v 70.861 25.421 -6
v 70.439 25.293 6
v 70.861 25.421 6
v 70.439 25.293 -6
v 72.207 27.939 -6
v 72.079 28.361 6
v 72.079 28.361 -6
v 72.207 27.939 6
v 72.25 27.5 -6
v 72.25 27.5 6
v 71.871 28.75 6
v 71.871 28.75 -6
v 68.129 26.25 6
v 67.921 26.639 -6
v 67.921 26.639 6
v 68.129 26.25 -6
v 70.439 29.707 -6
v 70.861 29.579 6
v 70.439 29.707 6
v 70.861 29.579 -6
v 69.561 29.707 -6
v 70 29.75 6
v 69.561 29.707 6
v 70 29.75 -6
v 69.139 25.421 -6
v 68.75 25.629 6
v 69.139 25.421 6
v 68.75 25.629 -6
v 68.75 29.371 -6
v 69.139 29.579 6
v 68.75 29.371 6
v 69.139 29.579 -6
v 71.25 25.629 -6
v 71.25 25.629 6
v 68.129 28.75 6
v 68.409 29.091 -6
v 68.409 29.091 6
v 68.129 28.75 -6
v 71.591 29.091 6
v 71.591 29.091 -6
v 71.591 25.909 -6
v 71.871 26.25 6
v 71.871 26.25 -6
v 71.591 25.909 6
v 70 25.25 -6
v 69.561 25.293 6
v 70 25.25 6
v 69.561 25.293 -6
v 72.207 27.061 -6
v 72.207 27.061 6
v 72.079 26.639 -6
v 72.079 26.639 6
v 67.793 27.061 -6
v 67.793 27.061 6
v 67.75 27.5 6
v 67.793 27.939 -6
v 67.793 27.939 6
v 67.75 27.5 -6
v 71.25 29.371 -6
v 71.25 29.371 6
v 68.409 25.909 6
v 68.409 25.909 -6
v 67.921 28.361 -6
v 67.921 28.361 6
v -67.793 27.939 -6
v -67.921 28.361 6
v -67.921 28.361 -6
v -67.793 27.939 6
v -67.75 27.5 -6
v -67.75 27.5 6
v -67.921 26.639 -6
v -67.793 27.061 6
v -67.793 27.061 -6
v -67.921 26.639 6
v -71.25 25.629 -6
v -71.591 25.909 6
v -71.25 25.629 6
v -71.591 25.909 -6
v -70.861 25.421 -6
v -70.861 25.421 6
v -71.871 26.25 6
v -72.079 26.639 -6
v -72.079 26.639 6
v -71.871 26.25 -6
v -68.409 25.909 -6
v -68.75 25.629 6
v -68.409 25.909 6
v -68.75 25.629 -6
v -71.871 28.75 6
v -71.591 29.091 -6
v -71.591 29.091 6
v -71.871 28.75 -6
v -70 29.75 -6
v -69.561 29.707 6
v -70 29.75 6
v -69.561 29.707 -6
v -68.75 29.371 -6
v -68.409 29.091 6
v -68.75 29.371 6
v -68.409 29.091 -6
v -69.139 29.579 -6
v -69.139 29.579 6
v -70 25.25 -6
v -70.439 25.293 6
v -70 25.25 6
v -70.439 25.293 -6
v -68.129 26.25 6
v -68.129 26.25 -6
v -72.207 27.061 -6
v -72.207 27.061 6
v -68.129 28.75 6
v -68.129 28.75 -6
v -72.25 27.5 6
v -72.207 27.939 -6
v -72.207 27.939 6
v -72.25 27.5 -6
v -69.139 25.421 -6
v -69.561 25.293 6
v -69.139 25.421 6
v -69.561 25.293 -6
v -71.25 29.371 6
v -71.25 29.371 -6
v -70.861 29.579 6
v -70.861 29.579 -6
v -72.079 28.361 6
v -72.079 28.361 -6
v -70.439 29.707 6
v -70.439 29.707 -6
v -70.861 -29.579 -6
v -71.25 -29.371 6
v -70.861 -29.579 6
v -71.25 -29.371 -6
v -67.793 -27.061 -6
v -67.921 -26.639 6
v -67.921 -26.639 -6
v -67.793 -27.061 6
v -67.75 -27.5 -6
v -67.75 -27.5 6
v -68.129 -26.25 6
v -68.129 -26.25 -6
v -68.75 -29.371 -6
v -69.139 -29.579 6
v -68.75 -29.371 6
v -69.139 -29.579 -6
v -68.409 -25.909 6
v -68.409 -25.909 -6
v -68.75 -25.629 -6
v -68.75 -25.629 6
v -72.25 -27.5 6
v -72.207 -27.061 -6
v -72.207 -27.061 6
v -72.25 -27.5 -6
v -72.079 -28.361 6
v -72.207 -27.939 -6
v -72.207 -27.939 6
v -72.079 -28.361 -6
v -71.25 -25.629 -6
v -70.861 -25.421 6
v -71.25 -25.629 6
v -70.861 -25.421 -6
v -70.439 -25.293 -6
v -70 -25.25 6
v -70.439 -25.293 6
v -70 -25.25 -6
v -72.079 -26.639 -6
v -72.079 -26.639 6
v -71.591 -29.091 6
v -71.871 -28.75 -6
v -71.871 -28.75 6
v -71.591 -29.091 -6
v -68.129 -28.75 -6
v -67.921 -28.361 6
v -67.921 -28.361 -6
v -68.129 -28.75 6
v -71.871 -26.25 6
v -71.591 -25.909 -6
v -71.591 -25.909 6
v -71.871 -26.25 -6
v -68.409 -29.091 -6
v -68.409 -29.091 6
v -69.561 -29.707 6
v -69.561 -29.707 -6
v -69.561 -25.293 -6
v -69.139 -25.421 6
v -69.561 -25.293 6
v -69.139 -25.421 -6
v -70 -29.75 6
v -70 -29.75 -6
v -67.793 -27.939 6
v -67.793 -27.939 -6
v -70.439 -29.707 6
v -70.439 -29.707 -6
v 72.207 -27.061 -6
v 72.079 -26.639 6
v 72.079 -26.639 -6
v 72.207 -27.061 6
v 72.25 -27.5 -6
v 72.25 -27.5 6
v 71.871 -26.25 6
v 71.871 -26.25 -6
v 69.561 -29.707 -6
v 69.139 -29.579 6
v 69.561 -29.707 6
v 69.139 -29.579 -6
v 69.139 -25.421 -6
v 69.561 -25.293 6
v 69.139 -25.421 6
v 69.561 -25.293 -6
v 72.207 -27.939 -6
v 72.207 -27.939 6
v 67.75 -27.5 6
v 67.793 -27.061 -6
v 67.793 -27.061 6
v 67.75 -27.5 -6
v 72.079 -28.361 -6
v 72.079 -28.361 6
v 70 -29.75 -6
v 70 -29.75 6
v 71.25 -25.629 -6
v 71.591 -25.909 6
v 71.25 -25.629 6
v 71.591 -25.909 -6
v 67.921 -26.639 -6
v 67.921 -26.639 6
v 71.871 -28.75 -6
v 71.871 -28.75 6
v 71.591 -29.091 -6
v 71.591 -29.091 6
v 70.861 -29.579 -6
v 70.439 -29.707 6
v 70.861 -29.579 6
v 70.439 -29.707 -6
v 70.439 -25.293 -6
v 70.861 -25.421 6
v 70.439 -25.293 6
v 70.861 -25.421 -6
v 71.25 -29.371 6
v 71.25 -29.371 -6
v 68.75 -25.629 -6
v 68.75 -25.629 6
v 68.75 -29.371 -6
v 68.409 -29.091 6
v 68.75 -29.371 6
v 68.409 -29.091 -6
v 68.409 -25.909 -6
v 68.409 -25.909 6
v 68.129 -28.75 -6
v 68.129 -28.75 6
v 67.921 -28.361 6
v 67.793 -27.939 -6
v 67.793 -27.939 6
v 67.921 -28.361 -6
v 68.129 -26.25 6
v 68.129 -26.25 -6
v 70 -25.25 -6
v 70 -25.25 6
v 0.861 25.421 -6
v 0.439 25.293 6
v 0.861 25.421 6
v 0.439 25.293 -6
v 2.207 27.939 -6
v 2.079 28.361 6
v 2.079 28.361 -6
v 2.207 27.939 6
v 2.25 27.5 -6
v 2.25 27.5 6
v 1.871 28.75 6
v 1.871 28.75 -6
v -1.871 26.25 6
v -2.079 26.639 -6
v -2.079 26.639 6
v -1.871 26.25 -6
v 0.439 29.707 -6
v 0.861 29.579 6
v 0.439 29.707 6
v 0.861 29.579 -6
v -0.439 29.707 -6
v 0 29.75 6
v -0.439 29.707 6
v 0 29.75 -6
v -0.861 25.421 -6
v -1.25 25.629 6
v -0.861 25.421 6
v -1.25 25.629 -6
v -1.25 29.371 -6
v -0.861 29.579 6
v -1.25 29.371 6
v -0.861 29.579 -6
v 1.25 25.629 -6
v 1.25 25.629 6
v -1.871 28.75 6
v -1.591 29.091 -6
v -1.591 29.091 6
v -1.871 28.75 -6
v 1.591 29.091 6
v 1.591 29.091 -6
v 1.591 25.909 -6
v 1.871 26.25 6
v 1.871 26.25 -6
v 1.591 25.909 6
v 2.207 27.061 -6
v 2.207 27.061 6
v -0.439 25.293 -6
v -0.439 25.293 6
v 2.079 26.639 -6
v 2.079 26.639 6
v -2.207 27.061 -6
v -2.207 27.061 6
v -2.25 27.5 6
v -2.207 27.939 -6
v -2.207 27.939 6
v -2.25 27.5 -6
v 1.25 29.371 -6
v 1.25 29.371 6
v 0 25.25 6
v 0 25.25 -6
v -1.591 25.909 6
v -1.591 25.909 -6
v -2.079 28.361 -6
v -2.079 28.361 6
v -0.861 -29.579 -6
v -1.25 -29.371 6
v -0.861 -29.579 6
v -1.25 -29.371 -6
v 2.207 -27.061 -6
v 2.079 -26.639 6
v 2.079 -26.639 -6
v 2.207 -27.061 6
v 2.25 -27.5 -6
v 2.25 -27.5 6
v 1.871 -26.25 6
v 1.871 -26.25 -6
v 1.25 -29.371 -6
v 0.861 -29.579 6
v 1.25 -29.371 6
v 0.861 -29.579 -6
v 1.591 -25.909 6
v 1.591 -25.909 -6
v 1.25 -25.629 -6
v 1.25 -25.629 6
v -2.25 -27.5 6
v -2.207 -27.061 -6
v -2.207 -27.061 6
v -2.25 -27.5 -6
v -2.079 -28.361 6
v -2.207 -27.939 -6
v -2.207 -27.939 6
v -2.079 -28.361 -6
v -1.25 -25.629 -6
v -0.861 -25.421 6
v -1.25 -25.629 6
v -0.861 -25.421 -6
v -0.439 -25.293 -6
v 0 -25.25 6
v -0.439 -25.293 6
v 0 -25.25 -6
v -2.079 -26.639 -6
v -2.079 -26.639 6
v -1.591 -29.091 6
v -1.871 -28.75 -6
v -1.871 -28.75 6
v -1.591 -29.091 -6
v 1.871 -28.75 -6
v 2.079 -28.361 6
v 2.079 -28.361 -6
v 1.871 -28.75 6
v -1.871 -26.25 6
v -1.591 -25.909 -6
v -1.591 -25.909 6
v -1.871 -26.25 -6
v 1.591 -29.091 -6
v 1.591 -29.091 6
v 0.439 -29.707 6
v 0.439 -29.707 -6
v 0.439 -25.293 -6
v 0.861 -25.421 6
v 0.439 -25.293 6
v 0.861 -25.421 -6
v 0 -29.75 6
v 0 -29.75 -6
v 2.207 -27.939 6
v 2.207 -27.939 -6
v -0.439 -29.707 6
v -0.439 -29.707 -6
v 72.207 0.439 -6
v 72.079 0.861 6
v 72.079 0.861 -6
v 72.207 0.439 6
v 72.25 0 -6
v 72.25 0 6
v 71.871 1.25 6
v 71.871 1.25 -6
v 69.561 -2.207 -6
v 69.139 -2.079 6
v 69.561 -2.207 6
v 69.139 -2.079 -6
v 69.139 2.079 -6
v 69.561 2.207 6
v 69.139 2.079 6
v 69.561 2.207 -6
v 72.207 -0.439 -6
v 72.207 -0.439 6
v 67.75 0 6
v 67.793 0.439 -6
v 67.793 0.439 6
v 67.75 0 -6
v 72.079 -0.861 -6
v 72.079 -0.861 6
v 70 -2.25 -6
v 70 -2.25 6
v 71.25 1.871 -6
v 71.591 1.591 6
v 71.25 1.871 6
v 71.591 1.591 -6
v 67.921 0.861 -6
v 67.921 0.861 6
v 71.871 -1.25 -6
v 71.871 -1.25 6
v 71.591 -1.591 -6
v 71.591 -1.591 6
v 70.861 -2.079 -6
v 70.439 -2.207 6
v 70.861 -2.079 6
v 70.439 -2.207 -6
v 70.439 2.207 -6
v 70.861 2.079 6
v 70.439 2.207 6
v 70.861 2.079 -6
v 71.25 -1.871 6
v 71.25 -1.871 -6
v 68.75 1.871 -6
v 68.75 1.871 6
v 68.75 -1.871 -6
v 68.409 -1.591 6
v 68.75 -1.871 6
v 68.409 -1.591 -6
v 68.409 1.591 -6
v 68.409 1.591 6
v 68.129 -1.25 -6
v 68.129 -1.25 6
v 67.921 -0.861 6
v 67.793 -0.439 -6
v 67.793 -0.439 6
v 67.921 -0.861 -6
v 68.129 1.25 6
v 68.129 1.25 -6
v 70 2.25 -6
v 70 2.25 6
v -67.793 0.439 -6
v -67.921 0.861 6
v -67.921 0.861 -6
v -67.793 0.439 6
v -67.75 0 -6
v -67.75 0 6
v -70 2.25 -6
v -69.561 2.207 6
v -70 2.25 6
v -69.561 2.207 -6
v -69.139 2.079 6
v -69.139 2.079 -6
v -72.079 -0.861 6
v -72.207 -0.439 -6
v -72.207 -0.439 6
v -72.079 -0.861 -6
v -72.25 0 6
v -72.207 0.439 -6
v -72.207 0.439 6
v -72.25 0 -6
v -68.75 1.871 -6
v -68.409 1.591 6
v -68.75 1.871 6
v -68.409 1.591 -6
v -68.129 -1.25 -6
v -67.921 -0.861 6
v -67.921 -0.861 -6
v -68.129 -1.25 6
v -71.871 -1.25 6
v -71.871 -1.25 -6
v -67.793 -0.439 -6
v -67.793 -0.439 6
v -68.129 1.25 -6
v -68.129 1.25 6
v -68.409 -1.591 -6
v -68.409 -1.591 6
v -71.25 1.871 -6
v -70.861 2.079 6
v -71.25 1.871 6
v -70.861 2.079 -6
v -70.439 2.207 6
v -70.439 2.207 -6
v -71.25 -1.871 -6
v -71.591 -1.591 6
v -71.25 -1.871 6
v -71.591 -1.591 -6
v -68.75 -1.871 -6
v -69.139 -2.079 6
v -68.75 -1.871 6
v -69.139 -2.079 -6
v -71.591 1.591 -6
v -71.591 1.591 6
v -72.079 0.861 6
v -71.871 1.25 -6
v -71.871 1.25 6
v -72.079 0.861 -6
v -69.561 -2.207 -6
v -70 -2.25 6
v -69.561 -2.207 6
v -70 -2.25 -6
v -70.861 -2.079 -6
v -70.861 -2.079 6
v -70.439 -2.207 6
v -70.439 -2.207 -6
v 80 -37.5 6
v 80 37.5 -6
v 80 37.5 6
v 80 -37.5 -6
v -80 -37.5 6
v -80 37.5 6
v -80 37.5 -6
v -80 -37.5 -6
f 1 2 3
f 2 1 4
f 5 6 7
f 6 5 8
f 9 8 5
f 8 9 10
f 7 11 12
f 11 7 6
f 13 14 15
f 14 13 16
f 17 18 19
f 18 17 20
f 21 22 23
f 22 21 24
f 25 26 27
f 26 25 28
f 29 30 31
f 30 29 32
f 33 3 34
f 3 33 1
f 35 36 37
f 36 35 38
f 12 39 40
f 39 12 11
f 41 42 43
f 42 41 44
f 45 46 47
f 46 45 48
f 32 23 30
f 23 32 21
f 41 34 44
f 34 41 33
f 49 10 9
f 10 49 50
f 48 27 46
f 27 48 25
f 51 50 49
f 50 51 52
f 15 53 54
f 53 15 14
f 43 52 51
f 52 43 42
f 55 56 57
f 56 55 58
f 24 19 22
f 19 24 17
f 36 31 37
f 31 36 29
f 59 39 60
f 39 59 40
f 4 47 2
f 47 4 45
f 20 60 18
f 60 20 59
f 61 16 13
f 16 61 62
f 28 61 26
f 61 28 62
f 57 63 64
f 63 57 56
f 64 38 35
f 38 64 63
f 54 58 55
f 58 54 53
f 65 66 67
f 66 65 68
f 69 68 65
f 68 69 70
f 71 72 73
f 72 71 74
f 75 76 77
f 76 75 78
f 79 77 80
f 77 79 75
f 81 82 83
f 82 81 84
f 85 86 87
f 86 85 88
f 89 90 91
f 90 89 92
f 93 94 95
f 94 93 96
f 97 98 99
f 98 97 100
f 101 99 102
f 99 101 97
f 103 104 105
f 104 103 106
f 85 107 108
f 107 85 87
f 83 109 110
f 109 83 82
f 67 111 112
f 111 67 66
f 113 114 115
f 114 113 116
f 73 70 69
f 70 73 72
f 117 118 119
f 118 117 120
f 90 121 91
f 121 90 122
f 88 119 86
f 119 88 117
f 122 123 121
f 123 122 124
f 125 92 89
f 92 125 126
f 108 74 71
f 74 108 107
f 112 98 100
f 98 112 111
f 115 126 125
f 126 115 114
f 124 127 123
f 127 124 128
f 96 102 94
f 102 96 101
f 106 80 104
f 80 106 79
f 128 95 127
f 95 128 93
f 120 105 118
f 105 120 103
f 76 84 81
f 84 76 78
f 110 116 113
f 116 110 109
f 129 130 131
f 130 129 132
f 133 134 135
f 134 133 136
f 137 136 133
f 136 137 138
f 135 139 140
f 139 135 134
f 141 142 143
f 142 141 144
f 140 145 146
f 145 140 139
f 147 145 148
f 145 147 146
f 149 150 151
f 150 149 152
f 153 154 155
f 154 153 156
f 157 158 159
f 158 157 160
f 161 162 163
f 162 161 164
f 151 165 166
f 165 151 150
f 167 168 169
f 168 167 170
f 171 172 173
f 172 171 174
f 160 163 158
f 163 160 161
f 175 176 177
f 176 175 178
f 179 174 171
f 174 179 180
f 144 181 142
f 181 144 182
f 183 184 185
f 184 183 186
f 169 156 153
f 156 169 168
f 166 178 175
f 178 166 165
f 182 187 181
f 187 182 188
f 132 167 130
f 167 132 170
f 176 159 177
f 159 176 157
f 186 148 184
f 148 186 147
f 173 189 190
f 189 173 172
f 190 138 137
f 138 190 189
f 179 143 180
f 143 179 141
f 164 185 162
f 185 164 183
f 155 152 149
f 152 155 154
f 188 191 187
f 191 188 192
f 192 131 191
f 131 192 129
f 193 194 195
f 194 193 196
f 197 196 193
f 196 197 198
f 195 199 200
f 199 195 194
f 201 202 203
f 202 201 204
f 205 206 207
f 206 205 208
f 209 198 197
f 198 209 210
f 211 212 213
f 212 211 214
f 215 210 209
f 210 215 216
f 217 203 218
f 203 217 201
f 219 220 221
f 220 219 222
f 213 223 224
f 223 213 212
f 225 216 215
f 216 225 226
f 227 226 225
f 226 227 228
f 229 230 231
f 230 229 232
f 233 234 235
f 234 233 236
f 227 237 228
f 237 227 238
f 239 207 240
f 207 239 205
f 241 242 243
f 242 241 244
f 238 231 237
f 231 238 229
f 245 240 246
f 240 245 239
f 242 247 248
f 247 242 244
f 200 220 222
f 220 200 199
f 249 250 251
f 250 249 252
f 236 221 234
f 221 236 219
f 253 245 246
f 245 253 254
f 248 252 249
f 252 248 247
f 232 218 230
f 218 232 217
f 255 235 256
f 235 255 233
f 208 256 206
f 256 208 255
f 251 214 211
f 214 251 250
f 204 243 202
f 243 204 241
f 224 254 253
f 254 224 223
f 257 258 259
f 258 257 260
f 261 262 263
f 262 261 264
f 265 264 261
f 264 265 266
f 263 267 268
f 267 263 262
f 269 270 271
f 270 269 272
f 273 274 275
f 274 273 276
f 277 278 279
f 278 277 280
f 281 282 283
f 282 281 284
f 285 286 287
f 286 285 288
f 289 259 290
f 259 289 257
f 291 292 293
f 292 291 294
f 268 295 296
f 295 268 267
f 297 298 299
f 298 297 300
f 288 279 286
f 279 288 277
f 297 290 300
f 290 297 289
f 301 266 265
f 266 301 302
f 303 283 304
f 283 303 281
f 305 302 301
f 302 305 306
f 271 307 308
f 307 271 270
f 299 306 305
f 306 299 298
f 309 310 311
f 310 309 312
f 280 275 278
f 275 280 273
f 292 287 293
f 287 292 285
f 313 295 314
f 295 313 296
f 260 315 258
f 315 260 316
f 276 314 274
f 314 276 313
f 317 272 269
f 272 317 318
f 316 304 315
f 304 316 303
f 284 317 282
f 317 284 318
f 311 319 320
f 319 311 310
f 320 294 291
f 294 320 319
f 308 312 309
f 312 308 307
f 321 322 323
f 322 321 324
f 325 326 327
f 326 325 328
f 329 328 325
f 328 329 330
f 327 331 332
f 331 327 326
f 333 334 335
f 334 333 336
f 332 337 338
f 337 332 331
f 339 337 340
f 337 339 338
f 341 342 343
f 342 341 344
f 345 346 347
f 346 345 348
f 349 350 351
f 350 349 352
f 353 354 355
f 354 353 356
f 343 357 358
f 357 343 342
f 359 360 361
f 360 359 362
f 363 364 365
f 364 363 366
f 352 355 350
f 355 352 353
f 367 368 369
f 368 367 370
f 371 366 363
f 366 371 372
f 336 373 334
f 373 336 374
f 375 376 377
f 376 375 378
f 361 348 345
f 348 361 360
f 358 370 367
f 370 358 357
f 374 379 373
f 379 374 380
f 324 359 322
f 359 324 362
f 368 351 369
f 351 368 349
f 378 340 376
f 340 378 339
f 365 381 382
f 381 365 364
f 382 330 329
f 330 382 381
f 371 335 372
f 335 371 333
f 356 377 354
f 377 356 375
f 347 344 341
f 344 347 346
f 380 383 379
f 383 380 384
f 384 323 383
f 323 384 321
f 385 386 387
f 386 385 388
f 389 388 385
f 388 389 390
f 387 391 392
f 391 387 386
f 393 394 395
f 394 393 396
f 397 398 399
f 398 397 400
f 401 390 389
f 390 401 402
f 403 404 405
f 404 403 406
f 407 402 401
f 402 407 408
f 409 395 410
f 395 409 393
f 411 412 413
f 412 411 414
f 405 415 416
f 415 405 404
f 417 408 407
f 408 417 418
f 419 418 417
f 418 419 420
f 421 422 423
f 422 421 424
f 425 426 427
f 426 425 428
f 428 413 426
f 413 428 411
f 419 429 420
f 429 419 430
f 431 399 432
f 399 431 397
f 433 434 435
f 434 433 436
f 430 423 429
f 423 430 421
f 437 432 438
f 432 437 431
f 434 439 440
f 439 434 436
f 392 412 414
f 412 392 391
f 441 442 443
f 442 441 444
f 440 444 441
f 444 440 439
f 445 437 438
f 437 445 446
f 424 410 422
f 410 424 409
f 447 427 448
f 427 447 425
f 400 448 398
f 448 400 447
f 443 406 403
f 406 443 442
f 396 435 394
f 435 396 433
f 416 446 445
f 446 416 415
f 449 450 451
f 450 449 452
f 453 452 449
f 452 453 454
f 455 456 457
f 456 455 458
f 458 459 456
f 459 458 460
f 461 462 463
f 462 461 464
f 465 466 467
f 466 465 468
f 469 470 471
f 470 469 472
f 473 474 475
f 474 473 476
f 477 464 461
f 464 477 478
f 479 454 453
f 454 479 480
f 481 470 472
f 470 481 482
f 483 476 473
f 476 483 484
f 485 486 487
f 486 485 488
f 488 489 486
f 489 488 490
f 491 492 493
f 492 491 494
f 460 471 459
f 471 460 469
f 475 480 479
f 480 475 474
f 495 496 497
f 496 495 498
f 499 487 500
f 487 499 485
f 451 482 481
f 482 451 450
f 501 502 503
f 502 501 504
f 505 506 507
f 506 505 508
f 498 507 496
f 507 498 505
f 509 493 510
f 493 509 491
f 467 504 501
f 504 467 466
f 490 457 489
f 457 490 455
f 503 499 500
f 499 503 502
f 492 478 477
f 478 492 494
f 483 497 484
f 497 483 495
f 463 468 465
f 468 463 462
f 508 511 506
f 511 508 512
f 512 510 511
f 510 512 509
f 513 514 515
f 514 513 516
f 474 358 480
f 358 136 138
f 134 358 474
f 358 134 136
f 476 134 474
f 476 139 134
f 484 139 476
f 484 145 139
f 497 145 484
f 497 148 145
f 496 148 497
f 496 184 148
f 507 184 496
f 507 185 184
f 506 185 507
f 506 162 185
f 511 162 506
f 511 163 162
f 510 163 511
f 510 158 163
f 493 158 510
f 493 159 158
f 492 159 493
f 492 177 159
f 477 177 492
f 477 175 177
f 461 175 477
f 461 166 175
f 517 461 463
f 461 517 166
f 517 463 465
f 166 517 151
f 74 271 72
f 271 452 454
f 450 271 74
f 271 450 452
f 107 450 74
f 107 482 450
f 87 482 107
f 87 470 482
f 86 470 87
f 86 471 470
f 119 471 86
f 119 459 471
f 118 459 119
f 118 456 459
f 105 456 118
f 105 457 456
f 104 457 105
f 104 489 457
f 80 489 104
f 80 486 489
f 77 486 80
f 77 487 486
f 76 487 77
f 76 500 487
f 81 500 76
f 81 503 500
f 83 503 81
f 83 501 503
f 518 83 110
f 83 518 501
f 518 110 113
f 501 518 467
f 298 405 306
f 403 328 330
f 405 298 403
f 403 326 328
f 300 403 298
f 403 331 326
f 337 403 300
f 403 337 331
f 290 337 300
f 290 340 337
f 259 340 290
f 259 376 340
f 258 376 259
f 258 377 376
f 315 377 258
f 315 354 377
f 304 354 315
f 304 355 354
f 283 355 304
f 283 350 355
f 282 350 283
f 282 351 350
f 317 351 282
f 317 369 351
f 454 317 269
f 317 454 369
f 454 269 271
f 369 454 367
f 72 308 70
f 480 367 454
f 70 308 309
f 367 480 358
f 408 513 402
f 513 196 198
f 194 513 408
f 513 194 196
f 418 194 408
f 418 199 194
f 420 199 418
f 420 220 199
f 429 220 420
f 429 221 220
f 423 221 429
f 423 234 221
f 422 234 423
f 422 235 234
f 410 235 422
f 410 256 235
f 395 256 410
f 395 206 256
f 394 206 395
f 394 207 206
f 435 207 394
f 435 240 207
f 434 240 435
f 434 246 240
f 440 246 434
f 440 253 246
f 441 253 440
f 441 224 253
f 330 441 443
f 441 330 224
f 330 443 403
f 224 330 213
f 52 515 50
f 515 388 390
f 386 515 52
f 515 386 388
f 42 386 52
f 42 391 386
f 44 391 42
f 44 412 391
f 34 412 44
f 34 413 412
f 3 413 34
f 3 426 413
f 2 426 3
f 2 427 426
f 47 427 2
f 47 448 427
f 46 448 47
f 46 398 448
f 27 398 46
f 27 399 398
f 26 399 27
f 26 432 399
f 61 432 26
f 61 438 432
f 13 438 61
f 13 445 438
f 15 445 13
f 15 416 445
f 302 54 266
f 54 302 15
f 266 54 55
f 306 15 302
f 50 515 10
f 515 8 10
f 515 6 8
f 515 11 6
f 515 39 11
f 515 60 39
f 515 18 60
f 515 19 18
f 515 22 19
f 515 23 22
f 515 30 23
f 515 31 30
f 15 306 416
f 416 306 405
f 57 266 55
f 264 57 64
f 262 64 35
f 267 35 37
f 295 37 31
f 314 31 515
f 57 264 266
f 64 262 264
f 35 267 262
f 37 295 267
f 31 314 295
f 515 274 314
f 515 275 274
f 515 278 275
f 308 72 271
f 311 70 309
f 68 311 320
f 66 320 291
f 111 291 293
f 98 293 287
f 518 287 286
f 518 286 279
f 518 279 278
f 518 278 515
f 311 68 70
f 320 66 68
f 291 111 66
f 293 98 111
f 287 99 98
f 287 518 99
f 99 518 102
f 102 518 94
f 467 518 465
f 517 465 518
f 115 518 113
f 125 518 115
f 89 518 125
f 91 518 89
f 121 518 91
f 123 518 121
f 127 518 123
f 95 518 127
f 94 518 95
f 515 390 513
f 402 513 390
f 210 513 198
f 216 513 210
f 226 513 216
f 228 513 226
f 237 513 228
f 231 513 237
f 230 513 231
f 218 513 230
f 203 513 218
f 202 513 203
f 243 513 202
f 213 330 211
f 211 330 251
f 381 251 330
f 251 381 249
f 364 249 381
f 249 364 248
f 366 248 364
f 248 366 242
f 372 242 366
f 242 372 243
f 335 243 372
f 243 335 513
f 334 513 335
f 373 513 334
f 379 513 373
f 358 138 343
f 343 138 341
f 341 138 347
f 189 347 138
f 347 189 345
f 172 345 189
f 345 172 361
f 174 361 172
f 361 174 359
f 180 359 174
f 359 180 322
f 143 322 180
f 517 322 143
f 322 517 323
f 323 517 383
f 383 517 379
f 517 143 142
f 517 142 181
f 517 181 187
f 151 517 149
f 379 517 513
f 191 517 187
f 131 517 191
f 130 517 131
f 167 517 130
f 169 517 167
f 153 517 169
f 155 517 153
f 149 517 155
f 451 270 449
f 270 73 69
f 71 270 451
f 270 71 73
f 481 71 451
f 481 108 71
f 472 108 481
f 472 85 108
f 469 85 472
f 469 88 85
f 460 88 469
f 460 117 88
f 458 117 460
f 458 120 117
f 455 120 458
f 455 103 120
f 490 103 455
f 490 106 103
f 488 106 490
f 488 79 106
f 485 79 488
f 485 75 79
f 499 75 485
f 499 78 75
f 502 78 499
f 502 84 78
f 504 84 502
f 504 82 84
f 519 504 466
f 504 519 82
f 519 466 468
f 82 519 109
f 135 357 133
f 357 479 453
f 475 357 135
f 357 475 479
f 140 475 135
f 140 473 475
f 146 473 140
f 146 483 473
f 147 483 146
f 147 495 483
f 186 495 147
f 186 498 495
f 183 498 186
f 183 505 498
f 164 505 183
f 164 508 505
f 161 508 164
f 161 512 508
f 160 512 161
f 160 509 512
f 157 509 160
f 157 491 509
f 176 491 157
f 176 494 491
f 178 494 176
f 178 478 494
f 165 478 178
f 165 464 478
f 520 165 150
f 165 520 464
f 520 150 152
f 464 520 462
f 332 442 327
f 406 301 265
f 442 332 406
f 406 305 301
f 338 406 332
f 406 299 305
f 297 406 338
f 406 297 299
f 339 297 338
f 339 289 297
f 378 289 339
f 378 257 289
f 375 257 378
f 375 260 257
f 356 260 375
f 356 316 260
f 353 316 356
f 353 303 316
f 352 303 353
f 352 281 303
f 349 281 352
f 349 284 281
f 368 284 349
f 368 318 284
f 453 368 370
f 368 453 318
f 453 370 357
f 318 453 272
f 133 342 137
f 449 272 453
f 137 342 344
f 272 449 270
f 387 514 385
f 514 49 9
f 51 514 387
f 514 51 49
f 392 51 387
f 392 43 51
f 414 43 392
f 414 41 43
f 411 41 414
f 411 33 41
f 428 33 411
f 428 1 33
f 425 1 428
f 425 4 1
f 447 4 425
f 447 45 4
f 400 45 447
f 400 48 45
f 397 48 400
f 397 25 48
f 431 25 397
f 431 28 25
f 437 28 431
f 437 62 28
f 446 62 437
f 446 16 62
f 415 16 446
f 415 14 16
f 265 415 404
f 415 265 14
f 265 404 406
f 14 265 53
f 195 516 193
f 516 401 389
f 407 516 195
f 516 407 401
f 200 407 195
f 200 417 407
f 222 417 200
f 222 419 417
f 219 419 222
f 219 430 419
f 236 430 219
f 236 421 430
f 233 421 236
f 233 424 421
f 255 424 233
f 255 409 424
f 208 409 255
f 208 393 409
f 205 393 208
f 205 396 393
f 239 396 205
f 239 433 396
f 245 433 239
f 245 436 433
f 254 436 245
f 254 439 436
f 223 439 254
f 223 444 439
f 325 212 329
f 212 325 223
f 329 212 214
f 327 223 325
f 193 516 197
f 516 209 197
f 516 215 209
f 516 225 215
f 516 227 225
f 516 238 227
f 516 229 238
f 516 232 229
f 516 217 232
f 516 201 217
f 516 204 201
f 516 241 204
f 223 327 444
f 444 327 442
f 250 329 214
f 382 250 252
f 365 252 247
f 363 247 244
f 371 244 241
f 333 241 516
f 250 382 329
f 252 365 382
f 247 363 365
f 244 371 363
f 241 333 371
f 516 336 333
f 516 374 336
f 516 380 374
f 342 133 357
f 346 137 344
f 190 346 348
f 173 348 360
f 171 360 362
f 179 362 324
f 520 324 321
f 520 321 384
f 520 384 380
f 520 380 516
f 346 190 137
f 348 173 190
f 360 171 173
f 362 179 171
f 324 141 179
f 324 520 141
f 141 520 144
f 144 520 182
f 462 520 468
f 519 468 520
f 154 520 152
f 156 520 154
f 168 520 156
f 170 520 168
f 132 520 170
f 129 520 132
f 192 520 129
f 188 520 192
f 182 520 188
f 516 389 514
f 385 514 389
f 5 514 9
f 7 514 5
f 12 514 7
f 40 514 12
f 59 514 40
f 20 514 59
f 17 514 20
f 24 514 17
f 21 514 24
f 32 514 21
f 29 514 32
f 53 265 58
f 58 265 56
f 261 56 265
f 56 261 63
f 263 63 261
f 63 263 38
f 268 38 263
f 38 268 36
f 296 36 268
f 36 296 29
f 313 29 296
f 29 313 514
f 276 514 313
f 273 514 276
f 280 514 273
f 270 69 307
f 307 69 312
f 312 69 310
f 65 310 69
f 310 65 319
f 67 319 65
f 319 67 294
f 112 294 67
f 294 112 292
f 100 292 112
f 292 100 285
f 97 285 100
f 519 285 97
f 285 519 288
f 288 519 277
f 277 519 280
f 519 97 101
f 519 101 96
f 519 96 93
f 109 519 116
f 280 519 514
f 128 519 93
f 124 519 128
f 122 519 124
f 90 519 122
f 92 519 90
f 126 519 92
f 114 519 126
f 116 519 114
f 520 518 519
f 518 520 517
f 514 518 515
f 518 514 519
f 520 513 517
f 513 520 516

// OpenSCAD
$fn = 32;

// ----------------------------------------------------------------------
// Corner plate 160 x 75 x 12
// 8 holes, centres taken from the edge offset
// ----------------------------------------------------------------------

// --- parameters (mm) ---
plate = [160, 75, 12];  // overall size (x, y, z)
holes = 8;              // number of holes the drawing asks for
hole_d = 4.5;           // hole diameter
edge = 10;              // hole centre offset from the plate edge

// --- derived feature positions (mm) ---
corner_x = plate[0] / 2 - edge;  // = 70   corner hole X
corner_y = plate[1] / 2 - edge;  // = 27.5   corner hole Y
feature_centers = [
  [corner_x, corner_y],
  [-corner_x, corner_y],
  [-corner_x, -corner_y],
  [corner_x, -corner_y],
  [0, corner_y],
  [0, -corner_y],
  [corner_x, 0],
  [-corner_x, 0]
];   // hole centres the loop below drills

// plate outline, every hole drilled through with the same cutters
difference() {
  cube(plate, center = true);
  for (centre = feature_centers)
    translate([centre[0], centre[1], 0])
      cylinder(d = hole_d, h = plate[2] + 2, center = true);
}
